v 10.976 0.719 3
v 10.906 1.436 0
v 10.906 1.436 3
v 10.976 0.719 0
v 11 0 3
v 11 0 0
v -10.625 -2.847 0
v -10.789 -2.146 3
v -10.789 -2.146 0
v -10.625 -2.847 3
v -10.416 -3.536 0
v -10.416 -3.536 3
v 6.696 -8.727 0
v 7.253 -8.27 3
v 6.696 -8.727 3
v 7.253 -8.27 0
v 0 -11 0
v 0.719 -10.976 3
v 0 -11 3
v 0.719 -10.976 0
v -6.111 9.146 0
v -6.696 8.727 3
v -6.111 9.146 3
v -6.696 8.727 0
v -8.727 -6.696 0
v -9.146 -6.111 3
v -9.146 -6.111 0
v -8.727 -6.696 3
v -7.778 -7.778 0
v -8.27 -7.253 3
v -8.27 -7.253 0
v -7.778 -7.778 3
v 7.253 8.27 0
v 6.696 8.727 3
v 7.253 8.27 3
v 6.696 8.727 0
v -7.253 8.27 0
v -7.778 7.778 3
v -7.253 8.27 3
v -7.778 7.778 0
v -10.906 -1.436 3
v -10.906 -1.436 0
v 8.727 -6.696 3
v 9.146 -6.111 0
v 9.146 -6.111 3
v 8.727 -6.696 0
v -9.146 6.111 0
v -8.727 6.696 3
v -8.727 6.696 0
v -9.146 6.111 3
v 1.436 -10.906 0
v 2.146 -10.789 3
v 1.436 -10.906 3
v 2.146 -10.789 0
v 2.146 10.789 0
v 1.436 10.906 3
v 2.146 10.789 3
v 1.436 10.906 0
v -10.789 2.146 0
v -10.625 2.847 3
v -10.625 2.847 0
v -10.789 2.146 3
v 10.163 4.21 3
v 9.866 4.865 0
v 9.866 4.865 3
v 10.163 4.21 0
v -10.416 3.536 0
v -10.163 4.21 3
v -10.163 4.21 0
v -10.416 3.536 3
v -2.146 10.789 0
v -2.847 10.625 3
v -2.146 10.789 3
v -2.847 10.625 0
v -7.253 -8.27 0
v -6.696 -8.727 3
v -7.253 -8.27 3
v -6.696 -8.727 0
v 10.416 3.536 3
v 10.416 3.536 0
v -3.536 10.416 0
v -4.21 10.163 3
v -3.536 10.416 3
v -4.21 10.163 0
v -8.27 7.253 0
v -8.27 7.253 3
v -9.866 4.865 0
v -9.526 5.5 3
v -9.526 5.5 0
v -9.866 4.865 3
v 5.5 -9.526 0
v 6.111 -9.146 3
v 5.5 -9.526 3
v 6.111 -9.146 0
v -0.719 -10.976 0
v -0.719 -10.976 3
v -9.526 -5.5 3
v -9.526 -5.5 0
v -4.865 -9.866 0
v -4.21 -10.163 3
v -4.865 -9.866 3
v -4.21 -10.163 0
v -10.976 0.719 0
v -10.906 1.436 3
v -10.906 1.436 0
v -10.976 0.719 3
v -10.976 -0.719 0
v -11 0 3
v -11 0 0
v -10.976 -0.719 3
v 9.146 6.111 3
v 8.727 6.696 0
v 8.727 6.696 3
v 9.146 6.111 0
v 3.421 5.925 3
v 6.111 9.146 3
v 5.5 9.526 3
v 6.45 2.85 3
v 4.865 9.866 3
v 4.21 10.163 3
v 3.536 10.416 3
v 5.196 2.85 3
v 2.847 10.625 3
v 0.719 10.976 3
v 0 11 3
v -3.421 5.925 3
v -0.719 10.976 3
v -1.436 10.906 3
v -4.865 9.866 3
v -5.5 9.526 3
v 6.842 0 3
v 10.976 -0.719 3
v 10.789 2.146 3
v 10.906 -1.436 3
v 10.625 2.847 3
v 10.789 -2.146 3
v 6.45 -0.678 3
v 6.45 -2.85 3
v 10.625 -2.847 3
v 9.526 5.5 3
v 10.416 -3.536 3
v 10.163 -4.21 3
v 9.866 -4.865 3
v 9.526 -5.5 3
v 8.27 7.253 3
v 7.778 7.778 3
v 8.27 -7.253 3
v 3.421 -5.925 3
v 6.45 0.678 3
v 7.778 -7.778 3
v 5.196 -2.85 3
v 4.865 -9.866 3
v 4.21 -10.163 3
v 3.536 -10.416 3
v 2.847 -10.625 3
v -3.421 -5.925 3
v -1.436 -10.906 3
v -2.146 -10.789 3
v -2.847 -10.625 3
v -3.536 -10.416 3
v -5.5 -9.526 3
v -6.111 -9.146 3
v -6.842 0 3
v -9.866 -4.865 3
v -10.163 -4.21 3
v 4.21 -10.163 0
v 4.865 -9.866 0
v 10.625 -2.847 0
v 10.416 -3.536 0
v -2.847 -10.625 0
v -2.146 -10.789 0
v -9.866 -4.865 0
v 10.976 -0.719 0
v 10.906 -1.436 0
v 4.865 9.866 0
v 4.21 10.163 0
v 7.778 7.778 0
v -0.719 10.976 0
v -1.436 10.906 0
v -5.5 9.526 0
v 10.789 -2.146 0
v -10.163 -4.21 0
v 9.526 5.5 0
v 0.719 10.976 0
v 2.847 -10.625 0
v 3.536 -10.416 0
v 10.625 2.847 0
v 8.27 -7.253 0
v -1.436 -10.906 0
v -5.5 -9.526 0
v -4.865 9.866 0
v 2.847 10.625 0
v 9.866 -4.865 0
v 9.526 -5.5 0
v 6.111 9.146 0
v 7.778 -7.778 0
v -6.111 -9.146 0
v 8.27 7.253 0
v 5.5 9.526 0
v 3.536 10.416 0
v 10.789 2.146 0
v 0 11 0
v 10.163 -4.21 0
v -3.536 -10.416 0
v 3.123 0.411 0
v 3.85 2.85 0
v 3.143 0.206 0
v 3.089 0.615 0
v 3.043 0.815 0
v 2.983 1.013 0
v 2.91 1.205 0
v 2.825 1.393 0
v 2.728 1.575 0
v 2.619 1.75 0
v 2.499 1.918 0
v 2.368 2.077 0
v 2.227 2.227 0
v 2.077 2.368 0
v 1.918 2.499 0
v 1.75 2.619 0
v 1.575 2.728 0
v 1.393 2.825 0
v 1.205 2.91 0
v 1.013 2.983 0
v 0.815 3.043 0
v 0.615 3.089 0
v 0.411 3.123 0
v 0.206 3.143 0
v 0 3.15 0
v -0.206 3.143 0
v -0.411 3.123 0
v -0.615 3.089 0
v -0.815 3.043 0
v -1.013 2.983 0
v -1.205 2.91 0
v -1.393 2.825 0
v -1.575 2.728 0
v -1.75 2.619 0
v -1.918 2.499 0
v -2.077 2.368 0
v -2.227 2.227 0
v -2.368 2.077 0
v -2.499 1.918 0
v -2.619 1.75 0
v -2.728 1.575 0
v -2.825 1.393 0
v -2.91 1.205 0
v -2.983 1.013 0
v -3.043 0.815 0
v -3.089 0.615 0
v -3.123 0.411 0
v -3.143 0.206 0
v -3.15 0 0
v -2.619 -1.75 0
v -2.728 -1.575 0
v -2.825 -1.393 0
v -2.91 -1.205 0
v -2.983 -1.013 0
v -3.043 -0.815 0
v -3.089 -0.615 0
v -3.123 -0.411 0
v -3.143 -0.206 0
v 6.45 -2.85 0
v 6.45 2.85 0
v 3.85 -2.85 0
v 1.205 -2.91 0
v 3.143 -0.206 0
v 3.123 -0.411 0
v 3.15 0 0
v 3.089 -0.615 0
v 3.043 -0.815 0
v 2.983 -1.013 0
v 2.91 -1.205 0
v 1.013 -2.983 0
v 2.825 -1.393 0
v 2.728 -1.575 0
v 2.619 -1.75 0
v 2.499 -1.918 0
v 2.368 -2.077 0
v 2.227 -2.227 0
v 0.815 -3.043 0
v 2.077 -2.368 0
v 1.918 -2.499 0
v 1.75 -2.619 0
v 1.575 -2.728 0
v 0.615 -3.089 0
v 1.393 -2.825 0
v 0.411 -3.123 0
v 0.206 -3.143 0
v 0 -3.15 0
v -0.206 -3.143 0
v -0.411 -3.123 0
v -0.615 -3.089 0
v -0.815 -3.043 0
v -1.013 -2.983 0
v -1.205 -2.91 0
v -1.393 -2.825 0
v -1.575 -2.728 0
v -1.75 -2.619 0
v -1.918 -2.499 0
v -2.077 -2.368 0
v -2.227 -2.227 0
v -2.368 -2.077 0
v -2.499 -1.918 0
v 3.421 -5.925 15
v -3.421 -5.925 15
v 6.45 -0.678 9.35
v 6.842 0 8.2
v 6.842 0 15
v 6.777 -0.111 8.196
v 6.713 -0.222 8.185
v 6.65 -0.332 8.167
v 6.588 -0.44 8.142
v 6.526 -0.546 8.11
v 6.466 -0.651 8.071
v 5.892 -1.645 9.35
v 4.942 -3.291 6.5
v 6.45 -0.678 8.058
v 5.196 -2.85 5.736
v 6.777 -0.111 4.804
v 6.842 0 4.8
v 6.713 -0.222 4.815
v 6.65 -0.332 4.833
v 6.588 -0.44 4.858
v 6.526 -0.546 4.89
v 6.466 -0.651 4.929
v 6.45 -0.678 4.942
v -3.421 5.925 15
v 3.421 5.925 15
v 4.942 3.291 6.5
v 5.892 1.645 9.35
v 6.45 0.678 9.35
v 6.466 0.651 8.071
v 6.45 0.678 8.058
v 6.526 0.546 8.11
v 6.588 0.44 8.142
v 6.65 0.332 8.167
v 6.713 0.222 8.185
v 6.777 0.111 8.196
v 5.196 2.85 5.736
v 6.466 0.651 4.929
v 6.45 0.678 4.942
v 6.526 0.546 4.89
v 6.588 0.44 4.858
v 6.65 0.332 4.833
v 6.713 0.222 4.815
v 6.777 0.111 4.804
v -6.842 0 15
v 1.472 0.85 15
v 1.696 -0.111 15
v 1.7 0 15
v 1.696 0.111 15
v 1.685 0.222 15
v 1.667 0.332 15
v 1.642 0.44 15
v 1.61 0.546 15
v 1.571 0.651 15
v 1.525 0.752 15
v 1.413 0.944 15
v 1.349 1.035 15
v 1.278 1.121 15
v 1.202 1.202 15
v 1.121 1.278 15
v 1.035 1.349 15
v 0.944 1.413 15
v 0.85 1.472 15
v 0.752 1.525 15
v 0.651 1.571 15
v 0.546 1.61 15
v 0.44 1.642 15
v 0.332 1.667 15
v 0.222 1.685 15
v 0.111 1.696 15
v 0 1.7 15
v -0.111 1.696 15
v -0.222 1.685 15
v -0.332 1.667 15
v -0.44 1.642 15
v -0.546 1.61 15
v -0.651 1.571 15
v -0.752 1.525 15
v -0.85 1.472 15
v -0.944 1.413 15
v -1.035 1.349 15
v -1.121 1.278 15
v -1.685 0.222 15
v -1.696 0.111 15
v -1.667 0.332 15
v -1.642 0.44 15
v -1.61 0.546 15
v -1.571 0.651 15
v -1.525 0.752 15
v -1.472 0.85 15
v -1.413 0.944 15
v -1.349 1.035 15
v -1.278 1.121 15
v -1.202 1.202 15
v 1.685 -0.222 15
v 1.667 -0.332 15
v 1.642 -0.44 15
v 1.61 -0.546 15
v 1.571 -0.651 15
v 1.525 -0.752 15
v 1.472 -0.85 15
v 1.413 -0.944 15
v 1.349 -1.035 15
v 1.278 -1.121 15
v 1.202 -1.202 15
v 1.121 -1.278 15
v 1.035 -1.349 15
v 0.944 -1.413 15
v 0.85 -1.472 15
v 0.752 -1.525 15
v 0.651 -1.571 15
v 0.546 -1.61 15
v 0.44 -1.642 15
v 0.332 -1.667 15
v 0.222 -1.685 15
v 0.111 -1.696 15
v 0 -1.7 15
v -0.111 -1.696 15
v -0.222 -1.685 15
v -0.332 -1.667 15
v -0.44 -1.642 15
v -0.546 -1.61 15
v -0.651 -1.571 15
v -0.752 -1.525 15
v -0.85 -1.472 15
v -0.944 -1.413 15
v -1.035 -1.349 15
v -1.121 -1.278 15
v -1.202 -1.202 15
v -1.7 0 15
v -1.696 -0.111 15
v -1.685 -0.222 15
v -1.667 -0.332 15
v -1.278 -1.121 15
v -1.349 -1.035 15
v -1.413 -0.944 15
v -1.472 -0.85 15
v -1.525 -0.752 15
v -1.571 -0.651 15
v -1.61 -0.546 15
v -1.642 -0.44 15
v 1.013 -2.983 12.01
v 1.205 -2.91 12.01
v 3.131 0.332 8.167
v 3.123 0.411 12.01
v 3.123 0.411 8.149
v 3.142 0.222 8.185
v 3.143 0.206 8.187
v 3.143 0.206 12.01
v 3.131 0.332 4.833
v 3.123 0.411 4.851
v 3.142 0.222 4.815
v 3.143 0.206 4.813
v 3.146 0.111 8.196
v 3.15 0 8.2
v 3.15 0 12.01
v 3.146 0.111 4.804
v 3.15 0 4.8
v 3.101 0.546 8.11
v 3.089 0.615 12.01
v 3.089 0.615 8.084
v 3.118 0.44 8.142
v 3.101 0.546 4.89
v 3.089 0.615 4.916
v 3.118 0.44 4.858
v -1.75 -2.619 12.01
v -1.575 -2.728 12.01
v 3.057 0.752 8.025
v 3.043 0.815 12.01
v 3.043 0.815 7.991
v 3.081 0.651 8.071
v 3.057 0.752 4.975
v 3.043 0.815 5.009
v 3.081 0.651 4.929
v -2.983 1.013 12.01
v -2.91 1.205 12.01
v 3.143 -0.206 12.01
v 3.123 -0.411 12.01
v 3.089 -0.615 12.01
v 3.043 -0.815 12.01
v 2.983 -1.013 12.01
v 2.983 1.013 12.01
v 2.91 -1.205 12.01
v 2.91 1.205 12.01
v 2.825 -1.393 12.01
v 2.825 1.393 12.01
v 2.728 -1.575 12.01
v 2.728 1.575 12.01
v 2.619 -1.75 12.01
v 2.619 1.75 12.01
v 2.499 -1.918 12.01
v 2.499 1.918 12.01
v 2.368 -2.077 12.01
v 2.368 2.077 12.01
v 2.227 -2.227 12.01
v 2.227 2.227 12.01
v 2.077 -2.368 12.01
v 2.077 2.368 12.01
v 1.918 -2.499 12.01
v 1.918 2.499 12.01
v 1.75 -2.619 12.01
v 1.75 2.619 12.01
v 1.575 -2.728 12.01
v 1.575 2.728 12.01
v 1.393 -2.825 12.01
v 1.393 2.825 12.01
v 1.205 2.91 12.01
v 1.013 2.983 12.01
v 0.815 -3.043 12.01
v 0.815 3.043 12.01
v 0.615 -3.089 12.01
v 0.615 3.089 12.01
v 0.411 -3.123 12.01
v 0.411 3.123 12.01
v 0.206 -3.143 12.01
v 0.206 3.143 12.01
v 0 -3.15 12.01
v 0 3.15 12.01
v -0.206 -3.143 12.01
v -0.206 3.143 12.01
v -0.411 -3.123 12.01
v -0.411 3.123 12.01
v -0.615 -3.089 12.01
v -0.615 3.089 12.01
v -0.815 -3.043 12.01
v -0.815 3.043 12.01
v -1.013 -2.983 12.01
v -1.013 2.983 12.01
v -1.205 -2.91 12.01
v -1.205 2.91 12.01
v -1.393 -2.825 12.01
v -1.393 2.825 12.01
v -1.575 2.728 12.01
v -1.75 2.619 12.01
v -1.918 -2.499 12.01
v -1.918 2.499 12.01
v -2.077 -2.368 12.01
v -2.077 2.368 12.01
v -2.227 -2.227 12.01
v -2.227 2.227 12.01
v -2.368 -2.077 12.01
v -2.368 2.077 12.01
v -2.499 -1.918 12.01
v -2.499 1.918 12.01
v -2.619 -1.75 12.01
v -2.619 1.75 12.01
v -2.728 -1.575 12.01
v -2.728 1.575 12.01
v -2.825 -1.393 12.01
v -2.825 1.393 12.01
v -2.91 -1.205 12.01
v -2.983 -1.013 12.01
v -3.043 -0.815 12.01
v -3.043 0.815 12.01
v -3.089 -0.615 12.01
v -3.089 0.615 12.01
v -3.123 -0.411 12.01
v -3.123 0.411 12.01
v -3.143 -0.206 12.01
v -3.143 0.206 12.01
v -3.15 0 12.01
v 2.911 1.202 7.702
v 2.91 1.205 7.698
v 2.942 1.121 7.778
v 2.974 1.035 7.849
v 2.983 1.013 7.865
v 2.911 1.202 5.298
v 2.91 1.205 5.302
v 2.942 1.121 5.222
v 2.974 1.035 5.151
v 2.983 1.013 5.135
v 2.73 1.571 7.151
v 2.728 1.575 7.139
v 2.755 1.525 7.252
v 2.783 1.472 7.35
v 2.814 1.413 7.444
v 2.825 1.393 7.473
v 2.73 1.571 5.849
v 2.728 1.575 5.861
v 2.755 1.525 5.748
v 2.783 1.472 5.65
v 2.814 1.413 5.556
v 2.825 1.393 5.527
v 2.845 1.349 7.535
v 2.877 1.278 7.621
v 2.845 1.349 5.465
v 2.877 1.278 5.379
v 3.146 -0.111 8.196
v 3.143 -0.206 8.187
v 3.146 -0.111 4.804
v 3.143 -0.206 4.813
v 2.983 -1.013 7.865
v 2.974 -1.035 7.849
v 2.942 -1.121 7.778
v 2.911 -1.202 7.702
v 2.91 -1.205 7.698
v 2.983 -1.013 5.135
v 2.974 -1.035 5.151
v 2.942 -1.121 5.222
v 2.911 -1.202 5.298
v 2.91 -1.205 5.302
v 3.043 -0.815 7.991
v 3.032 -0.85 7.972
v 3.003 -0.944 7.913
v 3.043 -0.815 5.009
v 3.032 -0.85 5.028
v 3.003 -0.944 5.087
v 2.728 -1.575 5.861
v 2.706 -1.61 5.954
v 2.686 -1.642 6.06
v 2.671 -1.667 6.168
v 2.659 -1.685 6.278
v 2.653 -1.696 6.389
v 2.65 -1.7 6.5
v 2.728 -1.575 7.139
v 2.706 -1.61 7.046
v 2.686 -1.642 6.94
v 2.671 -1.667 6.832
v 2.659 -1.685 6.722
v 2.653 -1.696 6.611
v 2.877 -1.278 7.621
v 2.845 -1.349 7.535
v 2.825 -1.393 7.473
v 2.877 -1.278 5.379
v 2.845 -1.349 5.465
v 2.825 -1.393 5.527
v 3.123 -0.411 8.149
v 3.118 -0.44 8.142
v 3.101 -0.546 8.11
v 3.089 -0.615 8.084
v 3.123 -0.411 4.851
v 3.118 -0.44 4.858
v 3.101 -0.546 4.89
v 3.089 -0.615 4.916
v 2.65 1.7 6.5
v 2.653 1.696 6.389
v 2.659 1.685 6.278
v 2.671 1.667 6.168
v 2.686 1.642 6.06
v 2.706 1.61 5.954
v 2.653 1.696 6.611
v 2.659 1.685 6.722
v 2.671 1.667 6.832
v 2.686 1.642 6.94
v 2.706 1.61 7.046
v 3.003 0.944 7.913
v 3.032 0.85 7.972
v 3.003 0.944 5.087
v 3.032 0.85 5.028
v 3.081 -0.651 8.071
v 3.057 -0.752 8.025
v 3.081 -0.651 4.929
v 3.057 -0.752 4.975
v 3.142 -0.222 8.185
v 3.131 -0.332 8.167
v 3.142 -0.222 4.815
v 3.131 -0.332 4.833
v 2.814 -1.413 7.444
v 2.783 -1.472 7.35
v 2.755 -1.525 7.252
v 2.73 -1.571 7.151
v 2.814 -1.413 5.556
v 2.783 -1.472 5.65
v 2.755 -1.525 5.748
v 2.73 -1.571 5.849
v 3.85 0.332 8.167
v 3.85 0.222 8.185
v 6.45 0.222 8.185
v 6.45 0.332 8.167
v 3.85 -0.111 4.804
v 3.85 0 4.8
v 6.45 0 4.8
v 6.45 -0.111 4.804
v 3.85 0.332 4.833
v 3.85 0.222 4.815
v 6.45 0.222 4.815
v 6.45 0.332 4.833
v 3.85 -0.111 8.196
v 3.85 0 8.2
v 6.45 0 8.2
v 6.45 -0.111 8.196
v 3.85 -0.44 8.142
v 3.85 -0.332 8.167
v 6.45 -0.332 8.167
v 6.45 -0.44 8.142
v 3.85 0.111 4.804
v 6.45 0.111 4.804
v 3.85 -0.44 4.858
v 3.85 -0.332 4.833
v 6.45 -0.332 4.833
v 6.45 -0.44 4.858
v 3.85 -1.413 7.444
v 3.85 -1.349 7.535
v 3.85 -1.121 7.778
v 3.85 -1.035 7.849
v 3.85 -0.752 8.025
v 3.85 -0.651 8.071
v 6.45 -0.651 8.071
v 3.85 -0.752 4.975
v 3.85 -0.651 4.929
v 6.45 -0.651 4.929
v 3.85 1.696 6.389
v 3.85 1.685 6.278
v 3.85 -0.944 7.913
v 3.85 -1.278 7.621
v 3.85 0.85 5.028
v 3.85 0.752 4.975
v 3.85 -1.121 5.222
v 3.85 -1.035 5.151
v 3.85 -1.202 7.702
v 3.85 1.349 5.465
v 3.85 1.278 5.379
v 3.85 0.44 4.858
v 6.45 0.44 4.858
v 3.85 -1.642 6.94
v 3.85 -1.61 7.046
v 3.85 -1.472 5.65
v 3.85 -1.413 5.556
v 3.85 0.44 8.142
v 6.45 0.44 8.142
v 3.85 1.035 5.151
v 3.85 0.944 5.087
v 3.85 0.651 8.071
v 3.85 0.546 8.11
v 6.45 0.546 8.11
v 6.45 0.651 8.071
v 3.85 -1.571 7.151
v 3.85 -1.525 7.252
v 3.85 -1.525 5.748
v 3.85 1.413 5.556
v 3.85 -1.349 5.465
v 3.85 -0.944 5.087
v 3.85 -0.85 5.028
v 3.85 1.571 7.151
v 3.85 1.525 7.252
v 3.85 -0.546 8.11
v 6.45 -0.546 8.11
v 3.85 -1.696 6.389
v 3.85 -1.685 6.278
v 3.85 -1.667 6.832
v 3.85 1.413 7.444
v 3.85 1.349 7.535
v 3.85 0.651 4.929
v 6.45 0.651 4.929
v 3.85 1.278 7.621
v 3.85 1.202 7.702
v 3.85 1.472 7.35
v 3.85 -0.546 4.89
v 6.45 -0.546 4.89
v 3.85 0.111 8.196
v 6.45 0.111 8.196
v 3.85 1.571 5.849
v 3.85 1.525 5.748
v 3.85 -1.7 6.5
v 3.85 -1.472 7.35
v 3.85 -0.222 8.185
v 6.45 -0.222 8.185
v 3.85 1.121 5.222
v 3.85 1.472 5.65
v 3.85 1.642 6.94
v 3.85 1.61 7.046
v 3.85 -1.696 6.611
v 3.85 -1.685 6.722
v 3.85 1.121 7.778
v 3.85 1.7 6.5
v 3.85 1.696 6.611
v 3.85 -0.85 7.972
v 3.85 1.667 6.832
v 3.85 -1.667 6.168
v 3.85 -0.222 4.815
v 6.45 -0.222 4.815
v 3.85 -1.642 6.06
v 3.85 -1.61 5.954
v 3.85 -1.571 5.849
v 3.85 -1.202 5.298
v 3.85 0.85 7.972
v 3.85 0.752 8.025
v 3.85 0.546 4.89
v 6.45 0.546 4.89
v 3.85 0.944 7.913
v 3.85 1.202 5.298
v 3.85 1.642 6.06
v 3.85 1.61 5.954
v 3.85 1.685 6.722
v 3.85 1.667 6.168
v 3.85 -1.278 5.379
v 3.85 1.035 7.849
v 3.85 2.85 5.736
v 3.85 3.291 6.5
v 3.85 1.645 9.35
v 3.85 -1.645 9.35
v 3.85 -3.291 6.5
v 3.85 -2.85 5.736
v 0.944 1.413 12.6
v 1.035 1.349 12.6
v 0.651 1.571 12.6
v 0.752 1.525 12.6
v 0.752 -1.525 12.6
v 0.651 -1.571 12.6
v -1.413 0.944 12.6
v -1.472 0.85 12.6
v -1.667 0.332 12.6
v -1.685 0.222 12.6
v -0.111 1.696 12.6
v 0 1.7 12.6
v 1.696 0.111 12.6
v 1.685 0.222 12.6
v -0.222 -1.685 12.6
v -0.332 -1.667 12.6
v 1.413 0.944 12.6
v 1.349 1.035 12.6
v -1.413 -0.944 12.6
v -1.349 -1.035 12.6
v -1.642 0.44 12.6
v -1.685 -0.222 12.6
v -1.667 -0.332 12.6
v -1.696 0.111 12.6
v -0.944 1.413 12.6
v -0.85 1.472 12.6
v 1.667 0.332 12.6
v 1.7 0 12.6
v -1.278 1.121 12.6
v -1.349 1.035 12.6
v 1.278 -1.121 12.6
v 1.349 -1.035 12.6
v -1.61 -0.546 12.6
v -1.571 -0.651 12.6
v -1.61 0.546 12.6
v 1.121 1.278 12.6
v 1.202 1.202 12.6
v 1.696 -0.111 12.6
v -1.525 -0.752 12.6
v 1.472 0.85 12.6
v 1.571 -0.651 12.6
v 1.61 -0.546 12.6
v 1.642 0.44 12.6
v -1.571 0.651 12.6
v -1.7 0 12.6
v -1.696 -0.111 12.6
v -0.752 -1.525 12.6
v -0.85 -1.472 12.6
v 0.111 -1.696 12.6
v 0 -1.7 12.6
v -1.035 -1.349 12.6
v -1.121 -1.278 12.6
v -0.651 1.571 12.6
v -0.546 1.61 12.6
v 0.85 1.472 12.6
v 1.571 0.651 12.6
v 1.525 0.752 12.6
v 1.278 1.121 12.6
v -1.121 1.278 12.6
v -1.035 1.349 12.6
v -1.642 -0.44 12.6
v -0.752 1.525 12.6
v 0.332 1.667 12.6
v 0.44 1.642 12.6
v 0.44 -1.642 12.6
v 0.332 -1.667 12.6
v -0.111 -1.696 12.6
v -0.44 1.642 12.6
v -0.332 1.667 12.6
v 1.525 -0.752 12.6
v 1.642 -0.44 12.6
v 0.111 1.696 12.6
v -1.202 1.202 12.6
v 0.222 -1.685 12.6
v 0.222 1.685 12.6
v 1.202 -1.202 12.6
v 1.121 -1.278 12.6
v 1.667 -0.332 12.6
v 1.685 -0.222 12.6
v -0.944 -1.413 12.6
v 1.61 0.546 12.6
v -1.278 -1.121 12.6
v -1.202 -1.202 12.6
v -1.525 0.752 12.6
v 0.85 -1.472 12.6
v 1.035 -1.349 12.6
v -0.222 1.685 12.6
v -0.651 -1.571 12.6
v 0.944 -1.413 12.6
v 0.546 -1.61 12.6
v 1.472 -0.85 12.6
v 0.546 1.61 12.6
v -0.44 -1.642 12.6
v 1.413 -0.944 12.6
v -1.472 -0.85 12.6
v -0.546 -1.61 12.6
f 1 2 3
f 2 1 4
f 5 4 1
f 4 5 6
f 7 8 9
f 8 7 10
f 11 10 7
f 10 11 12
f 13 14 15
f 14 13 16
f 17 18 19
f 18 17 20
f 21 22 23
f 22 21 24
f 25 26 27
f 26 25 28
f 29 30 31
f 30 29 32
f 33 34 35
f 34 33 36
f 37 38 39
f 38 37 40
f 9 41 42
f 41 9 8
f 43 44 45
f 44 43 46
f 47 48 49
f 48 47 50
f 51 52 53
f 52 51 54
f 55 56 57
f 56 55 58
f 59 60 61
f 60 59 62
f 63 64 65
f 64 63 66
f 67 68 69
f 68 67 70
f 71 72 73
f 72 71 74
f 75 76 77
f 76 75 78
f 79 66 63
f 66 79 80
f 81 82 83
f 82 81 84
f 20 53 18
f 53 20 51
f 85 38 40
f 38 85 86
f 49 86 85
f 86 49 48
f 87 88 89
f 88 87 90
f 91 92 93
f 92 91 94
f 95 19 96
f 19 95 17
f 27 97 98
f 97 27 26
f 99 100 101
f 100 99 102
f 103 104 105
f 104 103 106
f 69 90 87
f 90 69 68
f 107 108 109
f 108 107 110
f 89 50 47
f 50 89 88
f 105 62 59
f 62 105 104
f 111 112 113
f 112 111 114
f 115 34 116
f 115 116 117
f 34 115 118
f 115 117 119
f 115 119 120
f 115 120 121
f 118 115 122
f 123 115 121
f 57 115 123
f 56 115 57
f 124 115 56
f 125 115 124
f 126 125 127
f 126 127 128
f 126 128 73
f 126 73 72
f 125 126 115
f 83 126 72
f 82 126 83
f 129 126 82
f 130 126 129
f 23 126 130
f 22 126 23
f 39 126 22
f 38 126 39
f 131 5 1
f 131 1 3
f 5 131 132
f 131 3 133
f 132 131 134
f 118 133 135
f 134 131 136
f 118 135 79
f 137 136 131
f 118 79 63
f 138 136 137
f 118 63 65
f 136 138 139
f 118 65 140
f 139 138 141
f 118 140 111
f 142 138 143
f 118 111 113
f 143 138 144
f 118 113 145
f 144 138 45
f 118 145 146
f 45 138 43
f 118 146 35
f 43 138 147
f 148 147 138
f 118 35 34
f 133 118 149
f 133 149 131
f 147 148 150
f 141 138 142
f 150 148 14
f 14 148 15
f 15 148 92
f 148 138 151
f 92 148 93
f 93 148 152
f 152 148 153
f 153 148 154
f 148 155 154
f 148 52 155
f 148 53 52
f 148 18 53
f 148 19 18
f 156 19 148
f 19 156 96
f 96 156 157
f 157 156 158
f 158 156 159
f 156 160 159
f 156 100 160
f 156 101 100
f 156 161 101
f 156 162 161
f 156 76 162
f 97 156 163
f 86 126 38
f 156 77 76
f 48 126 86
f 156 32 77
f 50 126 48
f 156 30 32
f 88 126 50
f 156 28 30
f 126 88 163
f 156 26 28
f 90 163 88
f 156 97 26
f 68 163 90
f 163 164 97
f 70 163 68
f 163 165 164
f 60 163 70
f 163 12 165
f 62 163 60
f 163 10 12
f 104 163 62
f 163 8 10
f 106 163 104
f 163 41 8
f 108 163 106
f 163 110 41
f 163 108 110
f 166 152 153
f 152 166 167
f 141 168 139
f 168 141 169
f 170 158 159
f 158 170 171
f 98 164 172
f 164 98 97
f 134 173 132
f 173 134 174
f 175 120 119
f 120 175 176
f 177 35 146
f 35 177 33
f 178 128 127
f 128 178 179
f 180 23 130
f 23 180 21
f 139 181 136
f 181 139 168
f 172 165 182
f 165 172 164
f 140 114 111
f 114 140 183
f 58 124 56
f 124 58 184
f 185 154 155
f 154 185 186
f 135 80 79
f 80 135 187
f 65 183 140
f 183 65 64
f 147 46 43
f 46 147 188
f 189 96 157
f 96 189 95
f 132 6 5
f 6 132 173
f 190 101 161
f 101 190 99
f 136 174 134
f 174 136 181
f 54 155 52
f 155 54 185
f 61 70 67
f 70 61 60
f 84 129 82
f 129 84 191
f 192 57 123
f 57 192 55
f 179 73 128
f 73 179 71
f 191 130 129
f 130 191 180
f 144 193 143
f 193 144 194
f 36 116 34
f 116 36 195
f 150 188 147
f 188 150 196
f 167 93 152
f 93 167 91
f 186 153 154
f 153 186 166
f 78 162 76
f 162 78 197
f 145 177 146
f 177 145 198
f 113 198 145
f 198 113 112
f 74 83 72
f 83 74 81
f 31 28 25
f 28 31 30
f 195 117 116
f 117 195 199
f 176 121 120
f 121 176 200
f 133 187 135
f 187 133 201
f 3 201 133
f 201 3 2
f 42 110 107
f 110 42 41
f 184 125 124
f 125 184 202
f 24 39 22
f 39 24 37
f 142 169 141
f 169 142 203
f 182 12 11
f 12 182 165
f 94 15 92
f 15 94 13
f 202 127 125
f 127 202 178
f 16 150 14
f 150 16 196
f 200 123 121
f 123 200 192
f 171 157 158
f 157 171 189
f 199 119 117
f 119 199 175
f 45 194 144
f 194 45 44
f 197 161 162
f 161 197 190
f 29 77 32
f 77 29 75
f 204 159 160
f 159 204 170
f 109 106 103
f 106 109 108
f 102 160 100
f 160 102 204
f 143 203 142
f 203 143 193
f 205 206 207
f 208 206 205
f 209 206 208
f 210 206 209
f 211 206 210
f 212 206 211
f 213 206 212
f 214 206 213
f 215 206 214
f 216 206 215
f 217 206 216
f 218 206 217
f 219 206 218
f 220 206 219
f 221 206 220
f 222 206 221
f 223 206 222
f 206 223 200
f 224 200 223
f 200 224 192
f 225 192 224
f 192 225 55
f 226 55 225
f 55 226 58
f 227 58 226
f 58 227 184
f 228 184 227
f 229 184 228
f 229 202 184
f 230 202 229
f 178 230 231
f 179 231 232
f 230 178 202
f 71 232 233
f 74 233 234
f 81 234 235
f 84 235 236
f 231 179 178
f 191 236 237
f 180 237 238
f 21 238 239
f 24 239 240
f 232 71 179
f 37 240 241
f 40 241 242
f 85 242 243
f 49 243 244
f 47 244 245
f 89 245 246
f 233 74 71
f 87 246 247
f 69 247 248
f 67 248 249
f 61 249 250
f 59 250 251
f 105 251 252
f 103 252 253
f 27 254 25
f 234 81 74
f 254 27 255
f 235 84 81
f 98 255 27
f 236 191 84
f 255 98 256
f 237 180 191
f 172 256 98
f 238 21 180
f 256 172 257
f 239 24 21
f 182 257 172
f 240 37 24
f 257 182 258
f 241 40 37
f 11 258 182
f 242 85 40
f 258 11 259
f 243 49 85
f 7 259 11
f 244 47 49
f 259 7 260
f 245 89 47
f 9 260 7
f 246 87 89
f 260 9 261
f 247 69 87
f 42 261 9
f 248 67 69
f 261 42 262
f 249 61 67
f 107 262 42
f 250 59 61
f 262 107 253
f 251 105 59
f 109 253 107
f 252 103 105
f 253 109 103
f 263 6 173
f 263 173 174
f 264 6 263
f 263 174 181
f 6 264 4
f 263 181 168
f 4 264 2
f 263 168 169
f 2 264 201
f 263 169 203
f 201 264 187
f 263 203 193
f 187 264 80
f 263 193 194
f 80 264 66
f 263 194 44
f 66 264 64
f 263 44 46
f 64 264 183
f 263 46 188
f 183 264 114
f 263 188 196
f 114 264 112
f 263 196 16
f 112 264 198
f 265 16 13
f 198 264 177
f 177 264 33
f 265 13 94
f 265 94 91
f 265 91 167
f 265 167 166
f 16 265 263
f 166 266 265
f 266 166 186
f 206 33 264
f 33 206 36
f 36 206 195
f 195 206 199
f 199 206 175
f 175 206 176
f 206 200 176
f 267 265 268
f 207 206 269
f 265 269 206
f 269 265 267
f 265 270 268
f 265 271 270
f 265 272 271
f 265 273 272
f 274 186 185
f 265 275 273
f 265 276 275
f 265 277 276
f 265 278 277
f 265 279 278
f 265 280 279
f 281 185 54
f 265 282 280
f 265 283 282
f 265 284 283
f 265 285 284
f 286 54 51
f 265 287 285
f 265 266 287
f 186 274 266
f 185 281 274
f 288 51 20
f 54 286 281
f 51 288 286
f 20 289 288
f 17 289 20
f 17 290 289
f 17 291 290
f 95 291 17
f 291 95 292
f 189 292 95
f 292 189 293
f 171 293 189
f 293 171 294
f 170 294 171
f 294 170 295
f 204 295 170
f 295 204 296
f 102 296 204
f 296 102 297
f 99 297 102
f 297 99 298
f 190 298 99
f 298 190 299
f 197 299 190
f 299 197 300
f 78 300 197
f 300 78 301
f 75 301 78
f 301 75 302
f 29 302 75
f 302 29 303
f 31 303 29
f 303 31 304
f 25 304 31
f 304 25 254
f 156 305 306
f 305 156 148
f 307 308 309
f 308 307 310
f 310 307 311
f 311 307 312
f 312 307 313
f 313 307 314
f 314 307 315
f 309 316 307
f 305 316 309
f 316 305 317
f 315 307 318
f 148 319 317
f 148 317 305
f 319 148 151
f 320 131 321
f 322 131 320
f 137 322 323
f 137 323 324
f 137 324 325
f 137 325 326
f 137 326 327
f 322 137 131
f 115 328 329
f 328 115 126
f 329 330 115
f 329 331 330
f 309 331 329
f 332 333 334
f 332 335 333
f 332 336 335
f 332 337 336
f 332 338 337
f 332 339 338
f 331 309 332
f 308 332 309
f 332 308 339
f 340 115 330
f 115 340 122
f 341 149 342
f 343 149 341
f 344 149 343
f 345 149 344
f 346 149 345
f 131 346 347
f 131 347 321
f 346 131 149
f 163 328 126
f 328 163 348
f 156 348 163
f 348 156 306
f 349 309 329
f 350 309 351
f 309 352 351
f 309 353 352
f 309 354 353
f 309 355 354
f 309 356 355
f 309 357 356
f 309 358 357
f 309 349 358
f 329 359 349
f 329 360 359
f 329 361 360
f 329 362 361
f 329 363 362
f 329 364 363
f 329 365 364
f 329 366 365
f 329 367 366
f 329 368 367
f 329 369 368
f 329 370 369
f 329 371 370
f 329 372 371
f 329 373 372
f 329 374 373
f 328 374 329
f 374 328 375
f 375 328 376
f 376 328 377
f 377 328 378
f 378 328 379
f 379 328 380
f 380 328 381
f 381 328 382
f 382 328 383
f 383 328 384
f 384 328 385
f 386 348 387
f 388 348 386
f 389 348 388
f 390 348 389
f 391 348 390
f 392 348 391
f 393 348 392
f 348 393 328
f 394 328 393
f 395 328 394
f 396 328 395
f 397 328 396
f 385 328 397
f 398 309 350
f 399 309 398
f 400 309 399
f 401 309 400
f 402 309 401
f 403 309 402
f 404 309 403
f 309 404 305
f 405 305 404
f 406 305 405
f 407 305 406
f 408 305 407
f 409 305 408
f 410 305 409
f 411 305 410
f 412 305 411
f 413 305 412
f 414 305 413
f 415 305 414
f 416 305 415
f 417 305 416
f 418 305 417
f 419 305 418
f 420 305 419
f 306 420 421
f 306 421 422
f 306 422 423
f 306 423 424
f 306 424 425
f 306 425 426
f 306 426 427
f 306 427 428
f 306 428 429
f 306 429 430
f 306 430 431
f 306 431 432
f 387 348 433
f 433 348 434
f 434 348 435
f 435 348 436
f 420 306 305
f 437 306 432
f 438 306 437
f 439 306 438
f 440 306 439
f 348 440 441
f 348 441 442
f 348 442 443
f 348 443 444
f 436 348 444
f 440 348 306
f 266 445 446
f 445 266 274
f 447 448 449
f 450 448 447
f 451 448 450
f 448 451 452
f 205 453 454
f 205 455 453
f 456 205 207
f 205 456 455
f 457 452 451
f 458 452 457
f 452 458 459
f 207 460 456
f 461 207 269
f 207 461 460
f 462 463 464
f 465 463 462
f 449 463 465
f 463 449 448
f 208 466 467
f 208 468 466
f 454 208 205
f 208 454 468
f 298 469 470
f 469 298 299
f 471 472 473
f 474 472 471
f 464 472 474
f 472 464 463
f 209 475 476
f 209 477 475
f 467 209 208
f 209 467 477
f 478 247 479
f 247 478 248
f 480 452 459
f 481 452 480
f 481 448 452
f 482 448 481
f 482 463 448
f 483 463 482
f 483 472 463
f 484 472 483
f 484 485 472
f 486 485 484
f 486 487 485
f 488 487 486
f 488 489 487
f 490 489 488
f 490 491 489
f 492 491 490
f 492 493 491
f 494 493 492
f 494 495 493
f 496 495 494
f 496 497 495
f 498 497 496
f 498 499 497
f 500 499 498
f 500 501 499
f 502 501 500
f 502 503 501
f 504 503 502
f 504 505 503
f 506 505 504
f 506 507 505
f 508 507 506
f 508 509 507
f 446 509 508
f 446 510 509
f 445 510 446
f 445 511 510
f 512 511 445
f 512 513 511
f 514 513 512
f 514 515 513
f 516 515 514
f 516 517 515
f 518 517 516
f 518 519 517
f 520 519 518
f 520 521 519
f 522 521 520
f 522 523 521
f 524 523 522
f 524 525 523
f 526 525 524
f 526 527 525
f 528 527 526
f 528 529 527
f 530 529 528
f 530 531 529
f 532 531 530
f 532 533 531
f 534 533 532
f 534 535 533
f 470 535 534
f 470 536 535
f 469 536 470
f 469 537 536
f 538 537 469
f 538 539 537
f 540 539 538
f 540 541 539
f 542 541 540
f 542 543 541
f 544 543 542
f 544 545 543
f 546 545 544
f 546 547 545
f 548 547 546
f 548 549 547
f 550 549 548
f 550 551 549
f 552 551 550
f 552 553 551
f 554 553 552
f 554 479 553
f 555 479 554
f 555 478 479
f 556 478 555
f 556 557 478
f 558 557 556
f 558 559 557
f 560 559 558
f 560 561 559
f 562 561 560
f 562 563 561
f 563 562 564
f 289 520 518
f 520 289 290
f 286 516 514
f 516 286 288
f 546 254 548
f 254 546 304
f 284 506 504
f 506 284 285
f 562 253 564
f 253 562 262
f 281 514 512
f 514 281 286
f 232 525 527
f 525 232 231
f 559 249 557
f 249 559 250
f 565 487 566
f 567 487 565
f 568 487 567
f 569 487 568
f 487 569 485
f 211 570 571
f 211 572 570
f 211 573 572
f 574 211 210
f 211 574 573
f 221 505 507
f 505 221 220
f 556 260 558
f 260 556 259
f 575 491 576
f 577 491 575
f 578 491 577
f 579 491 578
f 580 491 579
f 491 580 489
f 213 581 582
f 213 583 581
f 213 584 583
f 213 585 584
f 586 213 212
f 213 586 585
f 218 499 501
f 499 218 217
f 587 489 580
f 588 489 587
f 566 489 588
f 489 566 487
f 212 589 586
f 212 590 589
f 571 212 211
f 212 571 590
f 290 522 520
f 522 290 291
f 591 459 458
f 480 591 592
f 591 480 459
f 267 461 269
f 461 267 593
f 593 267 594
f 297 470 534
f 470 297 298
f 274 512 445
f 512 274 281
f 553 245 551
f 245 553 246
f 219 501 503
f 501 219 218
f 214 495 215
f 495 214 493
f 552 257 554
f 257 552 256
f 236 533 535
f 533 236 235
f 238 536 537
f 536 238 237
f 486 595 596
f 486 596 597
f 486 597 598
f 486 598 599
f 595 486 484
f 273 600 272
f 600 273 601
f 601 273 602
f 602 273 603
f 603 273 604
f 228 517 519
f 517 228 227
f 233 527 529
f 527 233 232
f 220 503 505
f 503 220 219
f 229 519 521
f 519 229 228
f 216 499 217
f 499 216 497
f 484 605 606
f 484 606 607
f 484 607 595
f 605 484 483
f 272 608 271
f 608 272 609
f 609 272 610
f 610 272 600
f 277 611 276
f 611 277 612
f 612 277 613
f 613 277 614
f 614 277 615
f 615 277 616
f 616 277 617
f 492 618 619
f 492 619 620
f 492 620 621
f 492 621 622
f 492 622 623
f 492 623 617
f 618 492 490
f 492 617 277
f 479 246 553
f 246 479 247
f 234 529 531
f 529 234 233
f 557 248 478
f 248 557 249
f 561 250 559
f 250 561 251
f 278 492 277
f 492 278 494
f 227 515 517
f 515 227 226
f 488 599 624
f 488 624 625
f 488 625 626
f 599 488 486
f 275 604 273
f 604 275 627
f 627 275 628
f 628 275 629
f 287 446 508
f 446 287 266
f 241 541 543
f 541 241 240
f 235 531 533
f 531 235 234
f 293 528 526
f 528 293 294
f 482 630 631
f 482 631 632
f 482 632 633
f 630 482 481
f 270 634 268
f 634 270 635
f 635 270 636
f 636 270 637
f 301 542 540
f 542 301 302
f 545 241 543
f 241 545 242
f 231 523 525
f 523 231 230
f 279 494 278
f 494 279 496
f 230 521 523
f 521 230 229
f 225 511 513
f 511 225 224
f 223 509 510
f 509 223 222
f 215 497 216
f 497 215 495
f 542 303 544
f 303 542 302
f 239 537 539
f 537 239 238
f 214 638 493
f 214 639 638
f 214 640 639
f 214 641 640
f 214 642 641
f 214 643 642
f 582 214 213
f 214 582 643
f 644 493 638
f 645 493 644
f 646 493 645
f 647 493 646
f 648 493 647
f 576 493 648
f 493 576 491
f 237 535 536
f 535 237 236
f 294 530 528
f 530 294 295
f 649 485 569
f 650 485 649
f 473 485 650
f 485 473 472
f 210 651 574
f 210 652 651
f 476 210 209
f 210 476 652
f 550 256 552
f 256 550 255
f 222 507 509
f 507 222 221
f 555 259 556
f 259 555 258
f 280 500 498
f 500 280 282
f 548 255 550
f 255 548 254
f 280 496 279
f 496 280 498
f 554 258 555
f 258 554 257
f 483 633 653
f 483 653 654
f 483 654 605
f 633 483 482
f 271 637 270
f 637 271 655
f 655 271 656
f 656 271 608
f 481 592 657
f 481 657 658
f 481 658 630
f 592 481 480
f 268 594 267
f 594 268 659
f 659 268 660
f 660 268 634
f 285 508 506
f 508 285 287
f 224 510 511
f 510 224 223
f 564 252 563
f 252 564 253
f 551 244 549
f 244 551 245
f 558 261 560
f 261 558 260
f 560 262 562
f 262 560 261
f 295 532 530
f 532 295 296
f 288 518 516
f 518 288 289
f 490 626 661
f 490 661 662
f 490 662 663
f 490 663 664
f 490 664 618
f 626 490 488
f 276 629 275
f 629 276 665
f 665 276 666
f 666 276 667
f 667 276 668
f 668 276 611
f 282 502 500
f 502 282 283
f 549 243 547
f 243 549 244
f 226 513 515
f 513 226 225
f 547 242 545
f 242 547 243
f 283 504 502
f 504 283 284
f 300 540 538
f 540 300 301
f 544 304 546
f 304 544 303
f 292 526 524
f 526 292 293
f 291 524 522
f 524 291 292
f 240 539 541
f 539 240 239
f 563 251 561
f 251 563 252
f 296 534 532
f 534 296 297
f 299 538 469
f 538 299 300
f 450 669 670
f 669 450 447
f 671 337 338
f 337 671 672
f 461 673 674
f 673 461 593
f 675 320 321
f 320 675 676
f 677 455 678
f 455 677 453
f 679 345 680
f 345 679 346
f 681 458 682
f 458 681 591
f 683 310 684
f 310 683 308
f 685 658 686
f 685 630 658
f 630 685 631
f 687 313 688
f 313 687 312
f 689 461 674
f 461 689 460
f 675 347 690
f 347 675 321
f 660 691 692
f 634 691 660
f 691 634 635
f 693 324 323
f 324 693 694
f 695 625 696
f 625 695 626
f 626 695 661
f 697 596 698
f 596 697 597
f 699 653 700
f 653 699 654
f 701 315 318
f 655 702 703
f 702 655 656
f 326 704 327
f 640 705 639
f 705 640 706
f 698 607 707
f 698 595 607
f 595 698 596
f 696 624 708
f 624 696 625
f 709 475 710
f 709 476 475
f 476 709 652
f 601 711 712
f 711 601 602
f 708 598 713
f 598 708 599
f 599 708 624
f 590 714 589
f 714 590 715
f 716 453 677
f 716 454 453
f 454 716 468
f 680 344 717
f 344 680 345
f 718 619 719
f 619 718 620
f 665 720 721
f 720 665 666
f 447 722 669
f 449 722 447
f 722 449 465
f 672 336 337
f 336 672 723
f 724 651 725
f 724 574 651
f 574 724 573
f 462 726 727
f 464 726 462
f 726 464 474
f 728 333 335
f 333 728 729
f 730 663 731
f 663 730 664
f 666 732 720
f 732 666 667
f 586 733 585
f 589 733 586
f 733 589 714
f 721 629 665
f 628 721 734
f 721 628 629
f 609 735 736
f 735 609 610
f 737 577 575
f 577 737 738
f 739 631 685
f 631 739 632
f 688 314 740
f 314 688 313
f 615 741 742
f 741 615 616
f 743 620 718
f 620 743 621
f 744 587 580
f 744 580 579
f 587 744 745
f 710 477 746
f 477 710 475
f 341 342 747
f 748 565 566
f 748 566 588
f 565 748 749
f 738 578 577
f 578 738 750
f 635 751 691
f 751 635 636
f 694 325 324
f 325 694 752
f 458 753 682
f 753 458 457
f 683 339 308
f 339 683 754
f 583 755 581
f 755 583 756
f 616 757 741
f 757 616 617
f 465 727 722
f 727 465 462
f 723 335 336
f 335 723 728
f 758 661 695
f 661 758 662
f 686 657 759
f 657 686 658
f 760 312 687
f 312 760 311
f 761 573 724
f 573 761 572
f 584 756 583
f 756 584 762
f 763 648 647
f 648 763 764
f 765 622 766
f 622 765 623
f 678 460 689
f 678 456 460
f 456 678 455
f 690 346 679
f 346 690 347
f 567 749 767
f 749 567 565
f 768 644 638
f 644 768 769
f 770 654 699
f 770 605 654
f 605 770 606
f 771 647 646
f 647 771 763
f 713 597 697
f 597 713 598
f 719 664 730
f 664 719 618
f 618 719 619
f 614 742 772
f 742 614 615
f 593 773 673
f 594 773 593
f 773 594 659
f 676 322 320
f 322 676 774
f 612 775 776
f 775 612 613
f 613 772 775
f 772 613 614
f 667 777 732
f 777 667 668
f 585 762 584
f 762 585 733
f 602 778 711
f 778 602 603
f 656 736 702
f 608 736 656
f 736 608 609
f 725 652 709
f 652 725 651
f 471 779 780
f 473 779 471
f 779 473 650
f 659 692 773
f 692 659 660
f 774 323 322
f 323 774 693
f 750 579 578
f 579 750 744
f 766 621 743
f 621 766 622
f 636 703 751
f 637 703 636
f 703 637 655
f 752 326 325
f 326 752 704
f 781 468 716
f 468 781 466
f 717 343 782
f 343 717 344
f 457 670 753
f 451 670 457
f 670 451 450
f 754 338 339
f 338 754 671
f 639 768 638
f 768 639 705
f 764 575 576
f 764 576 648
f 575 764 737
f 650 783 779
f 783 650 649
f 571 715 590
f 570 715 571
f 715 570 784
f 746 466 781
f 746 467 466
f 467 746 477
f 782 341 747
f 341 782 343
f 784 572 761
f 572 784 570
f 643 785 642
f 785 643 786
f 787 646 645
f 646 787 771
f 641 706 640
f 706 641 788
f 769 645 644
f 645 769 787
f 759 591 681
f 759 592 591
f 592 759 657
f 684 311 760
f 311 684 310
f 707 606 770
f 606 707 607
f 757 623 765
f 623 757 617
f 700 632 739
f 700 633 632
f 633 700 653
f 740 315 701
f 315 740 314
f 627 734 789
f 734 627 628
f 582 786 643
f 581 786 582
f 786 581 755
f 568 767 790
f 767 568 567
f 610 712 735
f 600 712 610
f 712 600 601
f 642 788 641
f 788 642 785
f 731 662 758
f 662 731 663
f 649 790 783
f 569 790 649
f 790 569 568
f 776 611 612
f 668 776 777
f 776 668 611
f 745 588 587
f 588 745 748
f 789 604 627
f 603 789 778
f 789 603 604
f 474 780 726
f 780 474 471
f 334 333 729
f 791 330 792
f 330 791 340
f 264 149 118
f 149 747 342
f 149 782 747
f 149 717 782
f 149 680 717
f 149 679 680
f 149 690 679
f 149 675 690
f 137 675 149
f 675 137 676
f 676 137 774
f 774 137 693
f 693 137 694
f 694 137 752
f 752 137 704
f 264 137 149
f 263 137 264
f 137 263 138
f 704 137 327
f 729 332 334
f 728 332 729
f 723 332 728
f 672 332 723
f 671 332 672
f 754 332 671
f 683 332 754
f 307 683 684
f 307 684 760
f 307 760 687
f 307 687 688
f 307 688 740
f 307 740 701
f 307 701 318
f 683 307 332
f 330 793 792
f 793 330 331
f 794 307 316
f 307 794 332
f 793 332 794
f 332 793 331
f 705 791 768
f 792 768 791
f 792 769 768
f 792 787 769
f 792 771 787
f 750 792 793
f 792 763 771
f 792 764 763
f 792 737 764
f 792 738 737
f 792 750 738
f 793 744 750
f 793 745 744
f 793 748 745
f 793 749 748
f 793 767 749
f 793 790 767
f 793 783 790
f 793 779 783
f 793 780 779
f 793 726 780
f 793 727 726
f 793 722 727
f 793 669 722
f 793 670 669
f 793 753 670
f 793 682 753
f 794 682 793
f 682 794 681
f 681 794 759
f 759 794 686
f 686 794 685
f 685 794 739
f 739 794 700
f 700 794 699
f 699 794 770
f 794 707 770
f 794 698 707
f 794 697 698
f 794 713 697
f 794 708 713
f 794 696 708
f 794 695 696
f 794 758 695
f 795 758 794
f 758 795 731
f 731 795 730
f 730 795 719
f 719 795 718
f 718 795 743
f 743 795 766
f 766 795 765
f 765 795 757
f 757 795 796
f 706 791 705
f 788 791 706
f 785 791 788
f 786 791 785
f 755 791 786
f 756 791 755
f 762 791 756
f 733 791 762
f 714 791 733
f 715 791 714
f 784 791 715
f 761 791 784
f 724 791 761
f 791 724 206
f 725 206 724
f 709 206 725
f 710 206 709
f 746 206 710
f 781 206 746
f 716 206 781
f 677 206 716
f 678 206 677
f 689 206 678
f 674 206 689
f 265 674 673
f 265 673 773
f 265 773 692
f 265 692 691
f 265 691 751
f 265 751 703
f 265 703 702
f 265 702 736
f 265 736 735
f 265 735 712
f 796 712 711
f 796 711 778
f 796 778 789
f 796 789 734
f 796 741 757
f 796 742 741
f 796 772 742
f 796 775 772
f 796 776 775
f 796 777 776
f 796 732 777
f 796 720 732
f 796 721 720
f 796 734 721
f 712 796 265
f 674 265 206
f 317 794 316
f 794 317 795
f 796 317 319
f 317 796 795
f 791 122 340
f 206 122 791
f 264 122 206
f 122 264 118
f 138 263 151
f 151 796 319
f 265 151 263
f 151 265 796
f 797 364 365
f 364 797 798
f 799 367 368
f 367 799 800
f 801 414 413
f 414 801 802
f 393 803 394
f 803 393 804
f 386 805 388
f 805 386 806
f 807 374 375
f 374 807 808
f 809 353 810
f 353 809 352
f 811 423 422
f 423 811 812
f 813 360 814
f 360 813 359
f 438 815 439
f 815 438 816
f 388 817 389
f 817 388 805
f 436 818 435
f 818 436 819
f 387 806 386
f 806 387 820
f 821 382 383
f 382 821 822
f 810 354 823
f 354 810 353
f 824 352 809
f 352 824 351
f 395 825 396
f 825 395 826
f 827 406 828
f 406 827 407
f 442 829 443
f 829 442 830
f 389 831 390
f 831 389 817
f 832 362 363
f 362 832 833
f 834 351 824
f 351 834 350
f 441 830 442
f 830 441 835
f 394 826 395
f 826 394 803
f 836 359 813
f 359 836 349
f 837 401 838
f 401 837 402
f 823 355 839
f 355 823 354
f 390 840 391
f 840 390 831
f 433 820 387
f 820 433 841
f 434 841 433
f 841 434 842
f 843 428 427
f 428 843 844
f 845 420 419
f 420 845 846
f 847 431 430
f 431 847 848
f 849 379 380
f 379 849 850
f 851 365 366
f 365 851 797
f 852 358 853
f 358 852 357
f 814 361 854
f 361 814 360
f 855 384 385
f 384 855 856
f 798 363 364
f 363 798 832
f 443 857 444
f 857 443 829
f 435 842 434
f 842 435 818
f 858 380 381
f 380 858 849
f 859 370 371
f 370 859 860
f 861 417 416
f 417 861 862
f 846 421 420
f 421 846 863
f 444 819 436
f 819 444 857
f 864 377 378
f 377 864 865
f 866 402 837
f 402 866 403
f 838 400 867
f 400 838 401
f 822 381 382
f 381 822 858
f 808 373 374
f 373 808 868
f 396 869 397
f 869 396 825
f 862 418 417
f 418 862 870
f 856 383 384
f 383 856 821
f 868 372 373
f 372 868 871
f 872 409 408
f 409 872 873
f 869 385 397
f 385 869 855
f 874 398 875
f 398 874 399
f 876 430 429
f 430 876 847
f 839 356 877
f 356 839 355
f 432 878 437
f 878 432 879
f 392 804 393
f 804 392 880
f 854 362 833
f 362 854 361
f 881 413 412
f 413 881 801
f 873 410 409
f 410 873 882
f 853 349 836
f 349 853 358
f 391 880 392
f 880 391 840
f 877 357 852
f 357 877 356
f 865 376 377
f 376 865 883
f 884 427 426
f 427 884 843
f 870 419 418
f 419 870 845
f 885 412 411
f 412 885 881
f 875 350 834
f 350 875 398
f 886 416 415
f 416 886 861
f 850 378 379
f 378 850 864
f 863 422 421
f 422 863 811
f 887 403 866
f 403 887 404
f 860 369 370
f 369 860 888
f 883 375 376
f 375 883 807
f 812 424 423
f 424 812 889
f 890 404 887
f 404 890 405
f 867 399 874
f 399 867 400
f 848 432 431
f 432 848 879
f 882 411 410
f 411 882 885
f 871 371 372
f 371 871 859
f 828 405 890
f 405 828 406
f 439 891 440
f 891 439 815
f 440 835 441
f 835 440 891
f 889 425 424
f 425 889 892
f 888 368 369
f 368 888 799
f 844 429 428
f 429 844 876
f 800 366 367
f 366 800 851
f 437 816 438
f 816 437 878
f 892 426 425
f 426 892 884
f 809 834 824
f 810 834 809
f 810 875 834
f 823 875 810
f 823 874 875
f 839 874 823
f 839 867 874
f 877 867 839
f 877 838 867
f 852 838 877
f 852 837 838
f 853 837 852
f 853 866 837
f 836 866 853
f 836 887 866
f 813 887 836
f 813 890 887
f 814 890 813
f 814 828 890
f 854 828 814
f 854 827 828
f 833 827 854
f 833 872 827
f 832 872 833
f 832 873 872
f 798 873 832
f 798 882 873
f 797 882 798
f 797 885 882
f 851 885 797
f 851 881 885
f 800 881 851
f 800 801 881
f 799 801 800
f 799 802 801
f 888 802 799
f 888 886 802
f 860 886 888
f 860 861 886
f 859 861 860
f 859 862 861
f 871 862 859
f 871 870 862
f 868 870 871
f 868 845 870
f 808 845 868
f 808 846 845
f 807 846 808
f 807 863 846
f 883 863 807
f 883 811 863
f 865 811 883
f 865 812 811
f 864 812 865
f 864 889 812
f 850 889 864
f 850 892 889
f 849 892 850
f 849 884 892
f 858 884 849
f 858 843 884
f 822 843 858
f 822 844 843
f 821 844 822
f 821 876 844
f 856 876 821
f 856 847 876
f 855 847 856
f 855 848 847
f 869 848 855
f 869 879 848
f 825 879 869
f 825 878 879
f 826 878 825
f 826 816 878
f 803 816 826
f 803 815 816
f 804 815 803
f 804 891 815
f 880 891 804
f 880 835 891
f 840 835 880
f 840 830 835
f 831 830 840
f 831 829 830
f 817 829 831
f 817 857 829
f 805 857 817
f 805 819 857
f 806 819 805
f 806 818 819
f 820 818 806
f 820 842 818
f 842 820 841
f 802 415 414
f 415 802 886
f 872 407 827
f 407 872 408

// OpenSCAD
// file: ../lib/common.scad
// Shared modules. Units: mm.
fn_preview = 24;
fn_render = 96;
function fn() = $preview ? fn_preview : fn_render;

// Regular hexagonal prism given distance across flats.
module hex_prism(across_flats, h) {
  cylinder(d = across_flats / cos(30), h = h, $fn = 6);
}

// D-shaped bore: diameter d with a flat at distance `flat_to_center` from the axis.
module d_bore(d, flat_to_center, h) {
  intersection() {
    cylinder(d = d, h = h, $fn = fn());
    translate([-d, -d / 2 - 1, 0]) cube([d / 2 + flat_to_center + d, d + 2, h]);
  }
}

// Clearance hole along Z (ISO medium fit).
function clearance(m) = m == 3 ? 3.4 : m == 4 ? 4.5 : m == 5 ? 5.5 : m + 0.5;
module clearance_hole(m, h) { cylinder(d = clearance(m), h = h, $fn = fn()); }

// Captive hex nut pocket with insertion slot along +X.
function nut_af(m) = m == 3 ? 5.5 : m == 4 ? 7.0 : m == 5 ? 8.0 : 1.8 * m;
function nut_h(m) = m == 3 ? 2.4 : m == 4 ? 3.2 : m == 5 ? 4.0 : 0.8 * m;
module nut_trap(m, slot_len = 10, tol = 0.2) {
  af = nut_af(m) + tol;
  h = nut_h(m) + tol;
  hex_prism(af, h);
  translate([0, -af / 2, 0]) cube([slot_len, af, h]);
}
// main file
// Wheel hub adapter: JGB37-3530 motor D-shaft -> 12 mm hex wheel (Talon 124 mm). Module M2.
// All interface dimensions MUST be measured on the real parts before printing (lesson 15).
include <../lib/common.scad>

/* [Shaft (measure with caliper)] */
shaft_d = 6.0;          // TODO measure: JGB37 output shaft diameter
shaft_flat = 2.5;       // TODO measure: axis-to-flat distance (D-cut)
shaft_engage = 12;      // length of shaft inside the hub
bore_tol = 0.15;        // radial clearance, tune with a test coupon

/* [Wheel interface (measure)] */
hex_af = 12.0;          // TODO measure: wheel hex socket across flats
hex_len = 10;           // TODO measure: wheel hub depth
hex_tol = 0.15;

/* [Flange and set screw] */
flange_d = 22;
flange_h = 3;
set_screw_m = 3;        // radial set screw on the shaft flat, captive nut
retain_screw_m = 3;     // axial screw holding the wheel (0 = none)

total_h = flange_h + max(hex_len, shaft_engage);

difference() {
  union() {
    cylinder(d = flange_d, h = flange_h, $fn = fn());
    translate([0, 0, flange_h]) hex_prism(hex_af - hex_tol, total_h - flange_h);
  }
  // D-bore from the motor side
  translate([0, 0, -0.01]) d_bore(shaft_d + 2 * bore_tol, shaft_flat + bore_tol, shaft_engage + 0.02);
  // set screw (radial, +X) acting on the shaft flat, with captive nut inserted from the motor side
  set_z = shaft_engage / 2 + 0.5;
  nut_x = shaft_flat + bore_tol + 1.2;
  translate([0, 0, set_z]) rotate([0, 90, 0]) cylinder(d = clearance(set_screw_m), h = hex_af, $fn = fn());
  translate([nut_x, 0, set_z]) rotate([0, 90, 0]) rotate([0, 0, 30])
    hex_prism(nut_af(set_screw_m) + 0.2, nut_h(set_screw_m) + 0.2);
  translate([nut_x, -(nut_af(set_screw_m) + 0.2) / 2, -0.01])
    cube([nut_h(set_screw_m) + 0.2, nut_af(set_screw_m) + 0.2, set_z + 0.01]);
  // axial wheel-retention screw from the wheel side
  if (retain_screw_m > 0)
    translate([0, 0, shaft_engage + 0.6]) clearance_hole(retain_screw_m, total_h);
}
